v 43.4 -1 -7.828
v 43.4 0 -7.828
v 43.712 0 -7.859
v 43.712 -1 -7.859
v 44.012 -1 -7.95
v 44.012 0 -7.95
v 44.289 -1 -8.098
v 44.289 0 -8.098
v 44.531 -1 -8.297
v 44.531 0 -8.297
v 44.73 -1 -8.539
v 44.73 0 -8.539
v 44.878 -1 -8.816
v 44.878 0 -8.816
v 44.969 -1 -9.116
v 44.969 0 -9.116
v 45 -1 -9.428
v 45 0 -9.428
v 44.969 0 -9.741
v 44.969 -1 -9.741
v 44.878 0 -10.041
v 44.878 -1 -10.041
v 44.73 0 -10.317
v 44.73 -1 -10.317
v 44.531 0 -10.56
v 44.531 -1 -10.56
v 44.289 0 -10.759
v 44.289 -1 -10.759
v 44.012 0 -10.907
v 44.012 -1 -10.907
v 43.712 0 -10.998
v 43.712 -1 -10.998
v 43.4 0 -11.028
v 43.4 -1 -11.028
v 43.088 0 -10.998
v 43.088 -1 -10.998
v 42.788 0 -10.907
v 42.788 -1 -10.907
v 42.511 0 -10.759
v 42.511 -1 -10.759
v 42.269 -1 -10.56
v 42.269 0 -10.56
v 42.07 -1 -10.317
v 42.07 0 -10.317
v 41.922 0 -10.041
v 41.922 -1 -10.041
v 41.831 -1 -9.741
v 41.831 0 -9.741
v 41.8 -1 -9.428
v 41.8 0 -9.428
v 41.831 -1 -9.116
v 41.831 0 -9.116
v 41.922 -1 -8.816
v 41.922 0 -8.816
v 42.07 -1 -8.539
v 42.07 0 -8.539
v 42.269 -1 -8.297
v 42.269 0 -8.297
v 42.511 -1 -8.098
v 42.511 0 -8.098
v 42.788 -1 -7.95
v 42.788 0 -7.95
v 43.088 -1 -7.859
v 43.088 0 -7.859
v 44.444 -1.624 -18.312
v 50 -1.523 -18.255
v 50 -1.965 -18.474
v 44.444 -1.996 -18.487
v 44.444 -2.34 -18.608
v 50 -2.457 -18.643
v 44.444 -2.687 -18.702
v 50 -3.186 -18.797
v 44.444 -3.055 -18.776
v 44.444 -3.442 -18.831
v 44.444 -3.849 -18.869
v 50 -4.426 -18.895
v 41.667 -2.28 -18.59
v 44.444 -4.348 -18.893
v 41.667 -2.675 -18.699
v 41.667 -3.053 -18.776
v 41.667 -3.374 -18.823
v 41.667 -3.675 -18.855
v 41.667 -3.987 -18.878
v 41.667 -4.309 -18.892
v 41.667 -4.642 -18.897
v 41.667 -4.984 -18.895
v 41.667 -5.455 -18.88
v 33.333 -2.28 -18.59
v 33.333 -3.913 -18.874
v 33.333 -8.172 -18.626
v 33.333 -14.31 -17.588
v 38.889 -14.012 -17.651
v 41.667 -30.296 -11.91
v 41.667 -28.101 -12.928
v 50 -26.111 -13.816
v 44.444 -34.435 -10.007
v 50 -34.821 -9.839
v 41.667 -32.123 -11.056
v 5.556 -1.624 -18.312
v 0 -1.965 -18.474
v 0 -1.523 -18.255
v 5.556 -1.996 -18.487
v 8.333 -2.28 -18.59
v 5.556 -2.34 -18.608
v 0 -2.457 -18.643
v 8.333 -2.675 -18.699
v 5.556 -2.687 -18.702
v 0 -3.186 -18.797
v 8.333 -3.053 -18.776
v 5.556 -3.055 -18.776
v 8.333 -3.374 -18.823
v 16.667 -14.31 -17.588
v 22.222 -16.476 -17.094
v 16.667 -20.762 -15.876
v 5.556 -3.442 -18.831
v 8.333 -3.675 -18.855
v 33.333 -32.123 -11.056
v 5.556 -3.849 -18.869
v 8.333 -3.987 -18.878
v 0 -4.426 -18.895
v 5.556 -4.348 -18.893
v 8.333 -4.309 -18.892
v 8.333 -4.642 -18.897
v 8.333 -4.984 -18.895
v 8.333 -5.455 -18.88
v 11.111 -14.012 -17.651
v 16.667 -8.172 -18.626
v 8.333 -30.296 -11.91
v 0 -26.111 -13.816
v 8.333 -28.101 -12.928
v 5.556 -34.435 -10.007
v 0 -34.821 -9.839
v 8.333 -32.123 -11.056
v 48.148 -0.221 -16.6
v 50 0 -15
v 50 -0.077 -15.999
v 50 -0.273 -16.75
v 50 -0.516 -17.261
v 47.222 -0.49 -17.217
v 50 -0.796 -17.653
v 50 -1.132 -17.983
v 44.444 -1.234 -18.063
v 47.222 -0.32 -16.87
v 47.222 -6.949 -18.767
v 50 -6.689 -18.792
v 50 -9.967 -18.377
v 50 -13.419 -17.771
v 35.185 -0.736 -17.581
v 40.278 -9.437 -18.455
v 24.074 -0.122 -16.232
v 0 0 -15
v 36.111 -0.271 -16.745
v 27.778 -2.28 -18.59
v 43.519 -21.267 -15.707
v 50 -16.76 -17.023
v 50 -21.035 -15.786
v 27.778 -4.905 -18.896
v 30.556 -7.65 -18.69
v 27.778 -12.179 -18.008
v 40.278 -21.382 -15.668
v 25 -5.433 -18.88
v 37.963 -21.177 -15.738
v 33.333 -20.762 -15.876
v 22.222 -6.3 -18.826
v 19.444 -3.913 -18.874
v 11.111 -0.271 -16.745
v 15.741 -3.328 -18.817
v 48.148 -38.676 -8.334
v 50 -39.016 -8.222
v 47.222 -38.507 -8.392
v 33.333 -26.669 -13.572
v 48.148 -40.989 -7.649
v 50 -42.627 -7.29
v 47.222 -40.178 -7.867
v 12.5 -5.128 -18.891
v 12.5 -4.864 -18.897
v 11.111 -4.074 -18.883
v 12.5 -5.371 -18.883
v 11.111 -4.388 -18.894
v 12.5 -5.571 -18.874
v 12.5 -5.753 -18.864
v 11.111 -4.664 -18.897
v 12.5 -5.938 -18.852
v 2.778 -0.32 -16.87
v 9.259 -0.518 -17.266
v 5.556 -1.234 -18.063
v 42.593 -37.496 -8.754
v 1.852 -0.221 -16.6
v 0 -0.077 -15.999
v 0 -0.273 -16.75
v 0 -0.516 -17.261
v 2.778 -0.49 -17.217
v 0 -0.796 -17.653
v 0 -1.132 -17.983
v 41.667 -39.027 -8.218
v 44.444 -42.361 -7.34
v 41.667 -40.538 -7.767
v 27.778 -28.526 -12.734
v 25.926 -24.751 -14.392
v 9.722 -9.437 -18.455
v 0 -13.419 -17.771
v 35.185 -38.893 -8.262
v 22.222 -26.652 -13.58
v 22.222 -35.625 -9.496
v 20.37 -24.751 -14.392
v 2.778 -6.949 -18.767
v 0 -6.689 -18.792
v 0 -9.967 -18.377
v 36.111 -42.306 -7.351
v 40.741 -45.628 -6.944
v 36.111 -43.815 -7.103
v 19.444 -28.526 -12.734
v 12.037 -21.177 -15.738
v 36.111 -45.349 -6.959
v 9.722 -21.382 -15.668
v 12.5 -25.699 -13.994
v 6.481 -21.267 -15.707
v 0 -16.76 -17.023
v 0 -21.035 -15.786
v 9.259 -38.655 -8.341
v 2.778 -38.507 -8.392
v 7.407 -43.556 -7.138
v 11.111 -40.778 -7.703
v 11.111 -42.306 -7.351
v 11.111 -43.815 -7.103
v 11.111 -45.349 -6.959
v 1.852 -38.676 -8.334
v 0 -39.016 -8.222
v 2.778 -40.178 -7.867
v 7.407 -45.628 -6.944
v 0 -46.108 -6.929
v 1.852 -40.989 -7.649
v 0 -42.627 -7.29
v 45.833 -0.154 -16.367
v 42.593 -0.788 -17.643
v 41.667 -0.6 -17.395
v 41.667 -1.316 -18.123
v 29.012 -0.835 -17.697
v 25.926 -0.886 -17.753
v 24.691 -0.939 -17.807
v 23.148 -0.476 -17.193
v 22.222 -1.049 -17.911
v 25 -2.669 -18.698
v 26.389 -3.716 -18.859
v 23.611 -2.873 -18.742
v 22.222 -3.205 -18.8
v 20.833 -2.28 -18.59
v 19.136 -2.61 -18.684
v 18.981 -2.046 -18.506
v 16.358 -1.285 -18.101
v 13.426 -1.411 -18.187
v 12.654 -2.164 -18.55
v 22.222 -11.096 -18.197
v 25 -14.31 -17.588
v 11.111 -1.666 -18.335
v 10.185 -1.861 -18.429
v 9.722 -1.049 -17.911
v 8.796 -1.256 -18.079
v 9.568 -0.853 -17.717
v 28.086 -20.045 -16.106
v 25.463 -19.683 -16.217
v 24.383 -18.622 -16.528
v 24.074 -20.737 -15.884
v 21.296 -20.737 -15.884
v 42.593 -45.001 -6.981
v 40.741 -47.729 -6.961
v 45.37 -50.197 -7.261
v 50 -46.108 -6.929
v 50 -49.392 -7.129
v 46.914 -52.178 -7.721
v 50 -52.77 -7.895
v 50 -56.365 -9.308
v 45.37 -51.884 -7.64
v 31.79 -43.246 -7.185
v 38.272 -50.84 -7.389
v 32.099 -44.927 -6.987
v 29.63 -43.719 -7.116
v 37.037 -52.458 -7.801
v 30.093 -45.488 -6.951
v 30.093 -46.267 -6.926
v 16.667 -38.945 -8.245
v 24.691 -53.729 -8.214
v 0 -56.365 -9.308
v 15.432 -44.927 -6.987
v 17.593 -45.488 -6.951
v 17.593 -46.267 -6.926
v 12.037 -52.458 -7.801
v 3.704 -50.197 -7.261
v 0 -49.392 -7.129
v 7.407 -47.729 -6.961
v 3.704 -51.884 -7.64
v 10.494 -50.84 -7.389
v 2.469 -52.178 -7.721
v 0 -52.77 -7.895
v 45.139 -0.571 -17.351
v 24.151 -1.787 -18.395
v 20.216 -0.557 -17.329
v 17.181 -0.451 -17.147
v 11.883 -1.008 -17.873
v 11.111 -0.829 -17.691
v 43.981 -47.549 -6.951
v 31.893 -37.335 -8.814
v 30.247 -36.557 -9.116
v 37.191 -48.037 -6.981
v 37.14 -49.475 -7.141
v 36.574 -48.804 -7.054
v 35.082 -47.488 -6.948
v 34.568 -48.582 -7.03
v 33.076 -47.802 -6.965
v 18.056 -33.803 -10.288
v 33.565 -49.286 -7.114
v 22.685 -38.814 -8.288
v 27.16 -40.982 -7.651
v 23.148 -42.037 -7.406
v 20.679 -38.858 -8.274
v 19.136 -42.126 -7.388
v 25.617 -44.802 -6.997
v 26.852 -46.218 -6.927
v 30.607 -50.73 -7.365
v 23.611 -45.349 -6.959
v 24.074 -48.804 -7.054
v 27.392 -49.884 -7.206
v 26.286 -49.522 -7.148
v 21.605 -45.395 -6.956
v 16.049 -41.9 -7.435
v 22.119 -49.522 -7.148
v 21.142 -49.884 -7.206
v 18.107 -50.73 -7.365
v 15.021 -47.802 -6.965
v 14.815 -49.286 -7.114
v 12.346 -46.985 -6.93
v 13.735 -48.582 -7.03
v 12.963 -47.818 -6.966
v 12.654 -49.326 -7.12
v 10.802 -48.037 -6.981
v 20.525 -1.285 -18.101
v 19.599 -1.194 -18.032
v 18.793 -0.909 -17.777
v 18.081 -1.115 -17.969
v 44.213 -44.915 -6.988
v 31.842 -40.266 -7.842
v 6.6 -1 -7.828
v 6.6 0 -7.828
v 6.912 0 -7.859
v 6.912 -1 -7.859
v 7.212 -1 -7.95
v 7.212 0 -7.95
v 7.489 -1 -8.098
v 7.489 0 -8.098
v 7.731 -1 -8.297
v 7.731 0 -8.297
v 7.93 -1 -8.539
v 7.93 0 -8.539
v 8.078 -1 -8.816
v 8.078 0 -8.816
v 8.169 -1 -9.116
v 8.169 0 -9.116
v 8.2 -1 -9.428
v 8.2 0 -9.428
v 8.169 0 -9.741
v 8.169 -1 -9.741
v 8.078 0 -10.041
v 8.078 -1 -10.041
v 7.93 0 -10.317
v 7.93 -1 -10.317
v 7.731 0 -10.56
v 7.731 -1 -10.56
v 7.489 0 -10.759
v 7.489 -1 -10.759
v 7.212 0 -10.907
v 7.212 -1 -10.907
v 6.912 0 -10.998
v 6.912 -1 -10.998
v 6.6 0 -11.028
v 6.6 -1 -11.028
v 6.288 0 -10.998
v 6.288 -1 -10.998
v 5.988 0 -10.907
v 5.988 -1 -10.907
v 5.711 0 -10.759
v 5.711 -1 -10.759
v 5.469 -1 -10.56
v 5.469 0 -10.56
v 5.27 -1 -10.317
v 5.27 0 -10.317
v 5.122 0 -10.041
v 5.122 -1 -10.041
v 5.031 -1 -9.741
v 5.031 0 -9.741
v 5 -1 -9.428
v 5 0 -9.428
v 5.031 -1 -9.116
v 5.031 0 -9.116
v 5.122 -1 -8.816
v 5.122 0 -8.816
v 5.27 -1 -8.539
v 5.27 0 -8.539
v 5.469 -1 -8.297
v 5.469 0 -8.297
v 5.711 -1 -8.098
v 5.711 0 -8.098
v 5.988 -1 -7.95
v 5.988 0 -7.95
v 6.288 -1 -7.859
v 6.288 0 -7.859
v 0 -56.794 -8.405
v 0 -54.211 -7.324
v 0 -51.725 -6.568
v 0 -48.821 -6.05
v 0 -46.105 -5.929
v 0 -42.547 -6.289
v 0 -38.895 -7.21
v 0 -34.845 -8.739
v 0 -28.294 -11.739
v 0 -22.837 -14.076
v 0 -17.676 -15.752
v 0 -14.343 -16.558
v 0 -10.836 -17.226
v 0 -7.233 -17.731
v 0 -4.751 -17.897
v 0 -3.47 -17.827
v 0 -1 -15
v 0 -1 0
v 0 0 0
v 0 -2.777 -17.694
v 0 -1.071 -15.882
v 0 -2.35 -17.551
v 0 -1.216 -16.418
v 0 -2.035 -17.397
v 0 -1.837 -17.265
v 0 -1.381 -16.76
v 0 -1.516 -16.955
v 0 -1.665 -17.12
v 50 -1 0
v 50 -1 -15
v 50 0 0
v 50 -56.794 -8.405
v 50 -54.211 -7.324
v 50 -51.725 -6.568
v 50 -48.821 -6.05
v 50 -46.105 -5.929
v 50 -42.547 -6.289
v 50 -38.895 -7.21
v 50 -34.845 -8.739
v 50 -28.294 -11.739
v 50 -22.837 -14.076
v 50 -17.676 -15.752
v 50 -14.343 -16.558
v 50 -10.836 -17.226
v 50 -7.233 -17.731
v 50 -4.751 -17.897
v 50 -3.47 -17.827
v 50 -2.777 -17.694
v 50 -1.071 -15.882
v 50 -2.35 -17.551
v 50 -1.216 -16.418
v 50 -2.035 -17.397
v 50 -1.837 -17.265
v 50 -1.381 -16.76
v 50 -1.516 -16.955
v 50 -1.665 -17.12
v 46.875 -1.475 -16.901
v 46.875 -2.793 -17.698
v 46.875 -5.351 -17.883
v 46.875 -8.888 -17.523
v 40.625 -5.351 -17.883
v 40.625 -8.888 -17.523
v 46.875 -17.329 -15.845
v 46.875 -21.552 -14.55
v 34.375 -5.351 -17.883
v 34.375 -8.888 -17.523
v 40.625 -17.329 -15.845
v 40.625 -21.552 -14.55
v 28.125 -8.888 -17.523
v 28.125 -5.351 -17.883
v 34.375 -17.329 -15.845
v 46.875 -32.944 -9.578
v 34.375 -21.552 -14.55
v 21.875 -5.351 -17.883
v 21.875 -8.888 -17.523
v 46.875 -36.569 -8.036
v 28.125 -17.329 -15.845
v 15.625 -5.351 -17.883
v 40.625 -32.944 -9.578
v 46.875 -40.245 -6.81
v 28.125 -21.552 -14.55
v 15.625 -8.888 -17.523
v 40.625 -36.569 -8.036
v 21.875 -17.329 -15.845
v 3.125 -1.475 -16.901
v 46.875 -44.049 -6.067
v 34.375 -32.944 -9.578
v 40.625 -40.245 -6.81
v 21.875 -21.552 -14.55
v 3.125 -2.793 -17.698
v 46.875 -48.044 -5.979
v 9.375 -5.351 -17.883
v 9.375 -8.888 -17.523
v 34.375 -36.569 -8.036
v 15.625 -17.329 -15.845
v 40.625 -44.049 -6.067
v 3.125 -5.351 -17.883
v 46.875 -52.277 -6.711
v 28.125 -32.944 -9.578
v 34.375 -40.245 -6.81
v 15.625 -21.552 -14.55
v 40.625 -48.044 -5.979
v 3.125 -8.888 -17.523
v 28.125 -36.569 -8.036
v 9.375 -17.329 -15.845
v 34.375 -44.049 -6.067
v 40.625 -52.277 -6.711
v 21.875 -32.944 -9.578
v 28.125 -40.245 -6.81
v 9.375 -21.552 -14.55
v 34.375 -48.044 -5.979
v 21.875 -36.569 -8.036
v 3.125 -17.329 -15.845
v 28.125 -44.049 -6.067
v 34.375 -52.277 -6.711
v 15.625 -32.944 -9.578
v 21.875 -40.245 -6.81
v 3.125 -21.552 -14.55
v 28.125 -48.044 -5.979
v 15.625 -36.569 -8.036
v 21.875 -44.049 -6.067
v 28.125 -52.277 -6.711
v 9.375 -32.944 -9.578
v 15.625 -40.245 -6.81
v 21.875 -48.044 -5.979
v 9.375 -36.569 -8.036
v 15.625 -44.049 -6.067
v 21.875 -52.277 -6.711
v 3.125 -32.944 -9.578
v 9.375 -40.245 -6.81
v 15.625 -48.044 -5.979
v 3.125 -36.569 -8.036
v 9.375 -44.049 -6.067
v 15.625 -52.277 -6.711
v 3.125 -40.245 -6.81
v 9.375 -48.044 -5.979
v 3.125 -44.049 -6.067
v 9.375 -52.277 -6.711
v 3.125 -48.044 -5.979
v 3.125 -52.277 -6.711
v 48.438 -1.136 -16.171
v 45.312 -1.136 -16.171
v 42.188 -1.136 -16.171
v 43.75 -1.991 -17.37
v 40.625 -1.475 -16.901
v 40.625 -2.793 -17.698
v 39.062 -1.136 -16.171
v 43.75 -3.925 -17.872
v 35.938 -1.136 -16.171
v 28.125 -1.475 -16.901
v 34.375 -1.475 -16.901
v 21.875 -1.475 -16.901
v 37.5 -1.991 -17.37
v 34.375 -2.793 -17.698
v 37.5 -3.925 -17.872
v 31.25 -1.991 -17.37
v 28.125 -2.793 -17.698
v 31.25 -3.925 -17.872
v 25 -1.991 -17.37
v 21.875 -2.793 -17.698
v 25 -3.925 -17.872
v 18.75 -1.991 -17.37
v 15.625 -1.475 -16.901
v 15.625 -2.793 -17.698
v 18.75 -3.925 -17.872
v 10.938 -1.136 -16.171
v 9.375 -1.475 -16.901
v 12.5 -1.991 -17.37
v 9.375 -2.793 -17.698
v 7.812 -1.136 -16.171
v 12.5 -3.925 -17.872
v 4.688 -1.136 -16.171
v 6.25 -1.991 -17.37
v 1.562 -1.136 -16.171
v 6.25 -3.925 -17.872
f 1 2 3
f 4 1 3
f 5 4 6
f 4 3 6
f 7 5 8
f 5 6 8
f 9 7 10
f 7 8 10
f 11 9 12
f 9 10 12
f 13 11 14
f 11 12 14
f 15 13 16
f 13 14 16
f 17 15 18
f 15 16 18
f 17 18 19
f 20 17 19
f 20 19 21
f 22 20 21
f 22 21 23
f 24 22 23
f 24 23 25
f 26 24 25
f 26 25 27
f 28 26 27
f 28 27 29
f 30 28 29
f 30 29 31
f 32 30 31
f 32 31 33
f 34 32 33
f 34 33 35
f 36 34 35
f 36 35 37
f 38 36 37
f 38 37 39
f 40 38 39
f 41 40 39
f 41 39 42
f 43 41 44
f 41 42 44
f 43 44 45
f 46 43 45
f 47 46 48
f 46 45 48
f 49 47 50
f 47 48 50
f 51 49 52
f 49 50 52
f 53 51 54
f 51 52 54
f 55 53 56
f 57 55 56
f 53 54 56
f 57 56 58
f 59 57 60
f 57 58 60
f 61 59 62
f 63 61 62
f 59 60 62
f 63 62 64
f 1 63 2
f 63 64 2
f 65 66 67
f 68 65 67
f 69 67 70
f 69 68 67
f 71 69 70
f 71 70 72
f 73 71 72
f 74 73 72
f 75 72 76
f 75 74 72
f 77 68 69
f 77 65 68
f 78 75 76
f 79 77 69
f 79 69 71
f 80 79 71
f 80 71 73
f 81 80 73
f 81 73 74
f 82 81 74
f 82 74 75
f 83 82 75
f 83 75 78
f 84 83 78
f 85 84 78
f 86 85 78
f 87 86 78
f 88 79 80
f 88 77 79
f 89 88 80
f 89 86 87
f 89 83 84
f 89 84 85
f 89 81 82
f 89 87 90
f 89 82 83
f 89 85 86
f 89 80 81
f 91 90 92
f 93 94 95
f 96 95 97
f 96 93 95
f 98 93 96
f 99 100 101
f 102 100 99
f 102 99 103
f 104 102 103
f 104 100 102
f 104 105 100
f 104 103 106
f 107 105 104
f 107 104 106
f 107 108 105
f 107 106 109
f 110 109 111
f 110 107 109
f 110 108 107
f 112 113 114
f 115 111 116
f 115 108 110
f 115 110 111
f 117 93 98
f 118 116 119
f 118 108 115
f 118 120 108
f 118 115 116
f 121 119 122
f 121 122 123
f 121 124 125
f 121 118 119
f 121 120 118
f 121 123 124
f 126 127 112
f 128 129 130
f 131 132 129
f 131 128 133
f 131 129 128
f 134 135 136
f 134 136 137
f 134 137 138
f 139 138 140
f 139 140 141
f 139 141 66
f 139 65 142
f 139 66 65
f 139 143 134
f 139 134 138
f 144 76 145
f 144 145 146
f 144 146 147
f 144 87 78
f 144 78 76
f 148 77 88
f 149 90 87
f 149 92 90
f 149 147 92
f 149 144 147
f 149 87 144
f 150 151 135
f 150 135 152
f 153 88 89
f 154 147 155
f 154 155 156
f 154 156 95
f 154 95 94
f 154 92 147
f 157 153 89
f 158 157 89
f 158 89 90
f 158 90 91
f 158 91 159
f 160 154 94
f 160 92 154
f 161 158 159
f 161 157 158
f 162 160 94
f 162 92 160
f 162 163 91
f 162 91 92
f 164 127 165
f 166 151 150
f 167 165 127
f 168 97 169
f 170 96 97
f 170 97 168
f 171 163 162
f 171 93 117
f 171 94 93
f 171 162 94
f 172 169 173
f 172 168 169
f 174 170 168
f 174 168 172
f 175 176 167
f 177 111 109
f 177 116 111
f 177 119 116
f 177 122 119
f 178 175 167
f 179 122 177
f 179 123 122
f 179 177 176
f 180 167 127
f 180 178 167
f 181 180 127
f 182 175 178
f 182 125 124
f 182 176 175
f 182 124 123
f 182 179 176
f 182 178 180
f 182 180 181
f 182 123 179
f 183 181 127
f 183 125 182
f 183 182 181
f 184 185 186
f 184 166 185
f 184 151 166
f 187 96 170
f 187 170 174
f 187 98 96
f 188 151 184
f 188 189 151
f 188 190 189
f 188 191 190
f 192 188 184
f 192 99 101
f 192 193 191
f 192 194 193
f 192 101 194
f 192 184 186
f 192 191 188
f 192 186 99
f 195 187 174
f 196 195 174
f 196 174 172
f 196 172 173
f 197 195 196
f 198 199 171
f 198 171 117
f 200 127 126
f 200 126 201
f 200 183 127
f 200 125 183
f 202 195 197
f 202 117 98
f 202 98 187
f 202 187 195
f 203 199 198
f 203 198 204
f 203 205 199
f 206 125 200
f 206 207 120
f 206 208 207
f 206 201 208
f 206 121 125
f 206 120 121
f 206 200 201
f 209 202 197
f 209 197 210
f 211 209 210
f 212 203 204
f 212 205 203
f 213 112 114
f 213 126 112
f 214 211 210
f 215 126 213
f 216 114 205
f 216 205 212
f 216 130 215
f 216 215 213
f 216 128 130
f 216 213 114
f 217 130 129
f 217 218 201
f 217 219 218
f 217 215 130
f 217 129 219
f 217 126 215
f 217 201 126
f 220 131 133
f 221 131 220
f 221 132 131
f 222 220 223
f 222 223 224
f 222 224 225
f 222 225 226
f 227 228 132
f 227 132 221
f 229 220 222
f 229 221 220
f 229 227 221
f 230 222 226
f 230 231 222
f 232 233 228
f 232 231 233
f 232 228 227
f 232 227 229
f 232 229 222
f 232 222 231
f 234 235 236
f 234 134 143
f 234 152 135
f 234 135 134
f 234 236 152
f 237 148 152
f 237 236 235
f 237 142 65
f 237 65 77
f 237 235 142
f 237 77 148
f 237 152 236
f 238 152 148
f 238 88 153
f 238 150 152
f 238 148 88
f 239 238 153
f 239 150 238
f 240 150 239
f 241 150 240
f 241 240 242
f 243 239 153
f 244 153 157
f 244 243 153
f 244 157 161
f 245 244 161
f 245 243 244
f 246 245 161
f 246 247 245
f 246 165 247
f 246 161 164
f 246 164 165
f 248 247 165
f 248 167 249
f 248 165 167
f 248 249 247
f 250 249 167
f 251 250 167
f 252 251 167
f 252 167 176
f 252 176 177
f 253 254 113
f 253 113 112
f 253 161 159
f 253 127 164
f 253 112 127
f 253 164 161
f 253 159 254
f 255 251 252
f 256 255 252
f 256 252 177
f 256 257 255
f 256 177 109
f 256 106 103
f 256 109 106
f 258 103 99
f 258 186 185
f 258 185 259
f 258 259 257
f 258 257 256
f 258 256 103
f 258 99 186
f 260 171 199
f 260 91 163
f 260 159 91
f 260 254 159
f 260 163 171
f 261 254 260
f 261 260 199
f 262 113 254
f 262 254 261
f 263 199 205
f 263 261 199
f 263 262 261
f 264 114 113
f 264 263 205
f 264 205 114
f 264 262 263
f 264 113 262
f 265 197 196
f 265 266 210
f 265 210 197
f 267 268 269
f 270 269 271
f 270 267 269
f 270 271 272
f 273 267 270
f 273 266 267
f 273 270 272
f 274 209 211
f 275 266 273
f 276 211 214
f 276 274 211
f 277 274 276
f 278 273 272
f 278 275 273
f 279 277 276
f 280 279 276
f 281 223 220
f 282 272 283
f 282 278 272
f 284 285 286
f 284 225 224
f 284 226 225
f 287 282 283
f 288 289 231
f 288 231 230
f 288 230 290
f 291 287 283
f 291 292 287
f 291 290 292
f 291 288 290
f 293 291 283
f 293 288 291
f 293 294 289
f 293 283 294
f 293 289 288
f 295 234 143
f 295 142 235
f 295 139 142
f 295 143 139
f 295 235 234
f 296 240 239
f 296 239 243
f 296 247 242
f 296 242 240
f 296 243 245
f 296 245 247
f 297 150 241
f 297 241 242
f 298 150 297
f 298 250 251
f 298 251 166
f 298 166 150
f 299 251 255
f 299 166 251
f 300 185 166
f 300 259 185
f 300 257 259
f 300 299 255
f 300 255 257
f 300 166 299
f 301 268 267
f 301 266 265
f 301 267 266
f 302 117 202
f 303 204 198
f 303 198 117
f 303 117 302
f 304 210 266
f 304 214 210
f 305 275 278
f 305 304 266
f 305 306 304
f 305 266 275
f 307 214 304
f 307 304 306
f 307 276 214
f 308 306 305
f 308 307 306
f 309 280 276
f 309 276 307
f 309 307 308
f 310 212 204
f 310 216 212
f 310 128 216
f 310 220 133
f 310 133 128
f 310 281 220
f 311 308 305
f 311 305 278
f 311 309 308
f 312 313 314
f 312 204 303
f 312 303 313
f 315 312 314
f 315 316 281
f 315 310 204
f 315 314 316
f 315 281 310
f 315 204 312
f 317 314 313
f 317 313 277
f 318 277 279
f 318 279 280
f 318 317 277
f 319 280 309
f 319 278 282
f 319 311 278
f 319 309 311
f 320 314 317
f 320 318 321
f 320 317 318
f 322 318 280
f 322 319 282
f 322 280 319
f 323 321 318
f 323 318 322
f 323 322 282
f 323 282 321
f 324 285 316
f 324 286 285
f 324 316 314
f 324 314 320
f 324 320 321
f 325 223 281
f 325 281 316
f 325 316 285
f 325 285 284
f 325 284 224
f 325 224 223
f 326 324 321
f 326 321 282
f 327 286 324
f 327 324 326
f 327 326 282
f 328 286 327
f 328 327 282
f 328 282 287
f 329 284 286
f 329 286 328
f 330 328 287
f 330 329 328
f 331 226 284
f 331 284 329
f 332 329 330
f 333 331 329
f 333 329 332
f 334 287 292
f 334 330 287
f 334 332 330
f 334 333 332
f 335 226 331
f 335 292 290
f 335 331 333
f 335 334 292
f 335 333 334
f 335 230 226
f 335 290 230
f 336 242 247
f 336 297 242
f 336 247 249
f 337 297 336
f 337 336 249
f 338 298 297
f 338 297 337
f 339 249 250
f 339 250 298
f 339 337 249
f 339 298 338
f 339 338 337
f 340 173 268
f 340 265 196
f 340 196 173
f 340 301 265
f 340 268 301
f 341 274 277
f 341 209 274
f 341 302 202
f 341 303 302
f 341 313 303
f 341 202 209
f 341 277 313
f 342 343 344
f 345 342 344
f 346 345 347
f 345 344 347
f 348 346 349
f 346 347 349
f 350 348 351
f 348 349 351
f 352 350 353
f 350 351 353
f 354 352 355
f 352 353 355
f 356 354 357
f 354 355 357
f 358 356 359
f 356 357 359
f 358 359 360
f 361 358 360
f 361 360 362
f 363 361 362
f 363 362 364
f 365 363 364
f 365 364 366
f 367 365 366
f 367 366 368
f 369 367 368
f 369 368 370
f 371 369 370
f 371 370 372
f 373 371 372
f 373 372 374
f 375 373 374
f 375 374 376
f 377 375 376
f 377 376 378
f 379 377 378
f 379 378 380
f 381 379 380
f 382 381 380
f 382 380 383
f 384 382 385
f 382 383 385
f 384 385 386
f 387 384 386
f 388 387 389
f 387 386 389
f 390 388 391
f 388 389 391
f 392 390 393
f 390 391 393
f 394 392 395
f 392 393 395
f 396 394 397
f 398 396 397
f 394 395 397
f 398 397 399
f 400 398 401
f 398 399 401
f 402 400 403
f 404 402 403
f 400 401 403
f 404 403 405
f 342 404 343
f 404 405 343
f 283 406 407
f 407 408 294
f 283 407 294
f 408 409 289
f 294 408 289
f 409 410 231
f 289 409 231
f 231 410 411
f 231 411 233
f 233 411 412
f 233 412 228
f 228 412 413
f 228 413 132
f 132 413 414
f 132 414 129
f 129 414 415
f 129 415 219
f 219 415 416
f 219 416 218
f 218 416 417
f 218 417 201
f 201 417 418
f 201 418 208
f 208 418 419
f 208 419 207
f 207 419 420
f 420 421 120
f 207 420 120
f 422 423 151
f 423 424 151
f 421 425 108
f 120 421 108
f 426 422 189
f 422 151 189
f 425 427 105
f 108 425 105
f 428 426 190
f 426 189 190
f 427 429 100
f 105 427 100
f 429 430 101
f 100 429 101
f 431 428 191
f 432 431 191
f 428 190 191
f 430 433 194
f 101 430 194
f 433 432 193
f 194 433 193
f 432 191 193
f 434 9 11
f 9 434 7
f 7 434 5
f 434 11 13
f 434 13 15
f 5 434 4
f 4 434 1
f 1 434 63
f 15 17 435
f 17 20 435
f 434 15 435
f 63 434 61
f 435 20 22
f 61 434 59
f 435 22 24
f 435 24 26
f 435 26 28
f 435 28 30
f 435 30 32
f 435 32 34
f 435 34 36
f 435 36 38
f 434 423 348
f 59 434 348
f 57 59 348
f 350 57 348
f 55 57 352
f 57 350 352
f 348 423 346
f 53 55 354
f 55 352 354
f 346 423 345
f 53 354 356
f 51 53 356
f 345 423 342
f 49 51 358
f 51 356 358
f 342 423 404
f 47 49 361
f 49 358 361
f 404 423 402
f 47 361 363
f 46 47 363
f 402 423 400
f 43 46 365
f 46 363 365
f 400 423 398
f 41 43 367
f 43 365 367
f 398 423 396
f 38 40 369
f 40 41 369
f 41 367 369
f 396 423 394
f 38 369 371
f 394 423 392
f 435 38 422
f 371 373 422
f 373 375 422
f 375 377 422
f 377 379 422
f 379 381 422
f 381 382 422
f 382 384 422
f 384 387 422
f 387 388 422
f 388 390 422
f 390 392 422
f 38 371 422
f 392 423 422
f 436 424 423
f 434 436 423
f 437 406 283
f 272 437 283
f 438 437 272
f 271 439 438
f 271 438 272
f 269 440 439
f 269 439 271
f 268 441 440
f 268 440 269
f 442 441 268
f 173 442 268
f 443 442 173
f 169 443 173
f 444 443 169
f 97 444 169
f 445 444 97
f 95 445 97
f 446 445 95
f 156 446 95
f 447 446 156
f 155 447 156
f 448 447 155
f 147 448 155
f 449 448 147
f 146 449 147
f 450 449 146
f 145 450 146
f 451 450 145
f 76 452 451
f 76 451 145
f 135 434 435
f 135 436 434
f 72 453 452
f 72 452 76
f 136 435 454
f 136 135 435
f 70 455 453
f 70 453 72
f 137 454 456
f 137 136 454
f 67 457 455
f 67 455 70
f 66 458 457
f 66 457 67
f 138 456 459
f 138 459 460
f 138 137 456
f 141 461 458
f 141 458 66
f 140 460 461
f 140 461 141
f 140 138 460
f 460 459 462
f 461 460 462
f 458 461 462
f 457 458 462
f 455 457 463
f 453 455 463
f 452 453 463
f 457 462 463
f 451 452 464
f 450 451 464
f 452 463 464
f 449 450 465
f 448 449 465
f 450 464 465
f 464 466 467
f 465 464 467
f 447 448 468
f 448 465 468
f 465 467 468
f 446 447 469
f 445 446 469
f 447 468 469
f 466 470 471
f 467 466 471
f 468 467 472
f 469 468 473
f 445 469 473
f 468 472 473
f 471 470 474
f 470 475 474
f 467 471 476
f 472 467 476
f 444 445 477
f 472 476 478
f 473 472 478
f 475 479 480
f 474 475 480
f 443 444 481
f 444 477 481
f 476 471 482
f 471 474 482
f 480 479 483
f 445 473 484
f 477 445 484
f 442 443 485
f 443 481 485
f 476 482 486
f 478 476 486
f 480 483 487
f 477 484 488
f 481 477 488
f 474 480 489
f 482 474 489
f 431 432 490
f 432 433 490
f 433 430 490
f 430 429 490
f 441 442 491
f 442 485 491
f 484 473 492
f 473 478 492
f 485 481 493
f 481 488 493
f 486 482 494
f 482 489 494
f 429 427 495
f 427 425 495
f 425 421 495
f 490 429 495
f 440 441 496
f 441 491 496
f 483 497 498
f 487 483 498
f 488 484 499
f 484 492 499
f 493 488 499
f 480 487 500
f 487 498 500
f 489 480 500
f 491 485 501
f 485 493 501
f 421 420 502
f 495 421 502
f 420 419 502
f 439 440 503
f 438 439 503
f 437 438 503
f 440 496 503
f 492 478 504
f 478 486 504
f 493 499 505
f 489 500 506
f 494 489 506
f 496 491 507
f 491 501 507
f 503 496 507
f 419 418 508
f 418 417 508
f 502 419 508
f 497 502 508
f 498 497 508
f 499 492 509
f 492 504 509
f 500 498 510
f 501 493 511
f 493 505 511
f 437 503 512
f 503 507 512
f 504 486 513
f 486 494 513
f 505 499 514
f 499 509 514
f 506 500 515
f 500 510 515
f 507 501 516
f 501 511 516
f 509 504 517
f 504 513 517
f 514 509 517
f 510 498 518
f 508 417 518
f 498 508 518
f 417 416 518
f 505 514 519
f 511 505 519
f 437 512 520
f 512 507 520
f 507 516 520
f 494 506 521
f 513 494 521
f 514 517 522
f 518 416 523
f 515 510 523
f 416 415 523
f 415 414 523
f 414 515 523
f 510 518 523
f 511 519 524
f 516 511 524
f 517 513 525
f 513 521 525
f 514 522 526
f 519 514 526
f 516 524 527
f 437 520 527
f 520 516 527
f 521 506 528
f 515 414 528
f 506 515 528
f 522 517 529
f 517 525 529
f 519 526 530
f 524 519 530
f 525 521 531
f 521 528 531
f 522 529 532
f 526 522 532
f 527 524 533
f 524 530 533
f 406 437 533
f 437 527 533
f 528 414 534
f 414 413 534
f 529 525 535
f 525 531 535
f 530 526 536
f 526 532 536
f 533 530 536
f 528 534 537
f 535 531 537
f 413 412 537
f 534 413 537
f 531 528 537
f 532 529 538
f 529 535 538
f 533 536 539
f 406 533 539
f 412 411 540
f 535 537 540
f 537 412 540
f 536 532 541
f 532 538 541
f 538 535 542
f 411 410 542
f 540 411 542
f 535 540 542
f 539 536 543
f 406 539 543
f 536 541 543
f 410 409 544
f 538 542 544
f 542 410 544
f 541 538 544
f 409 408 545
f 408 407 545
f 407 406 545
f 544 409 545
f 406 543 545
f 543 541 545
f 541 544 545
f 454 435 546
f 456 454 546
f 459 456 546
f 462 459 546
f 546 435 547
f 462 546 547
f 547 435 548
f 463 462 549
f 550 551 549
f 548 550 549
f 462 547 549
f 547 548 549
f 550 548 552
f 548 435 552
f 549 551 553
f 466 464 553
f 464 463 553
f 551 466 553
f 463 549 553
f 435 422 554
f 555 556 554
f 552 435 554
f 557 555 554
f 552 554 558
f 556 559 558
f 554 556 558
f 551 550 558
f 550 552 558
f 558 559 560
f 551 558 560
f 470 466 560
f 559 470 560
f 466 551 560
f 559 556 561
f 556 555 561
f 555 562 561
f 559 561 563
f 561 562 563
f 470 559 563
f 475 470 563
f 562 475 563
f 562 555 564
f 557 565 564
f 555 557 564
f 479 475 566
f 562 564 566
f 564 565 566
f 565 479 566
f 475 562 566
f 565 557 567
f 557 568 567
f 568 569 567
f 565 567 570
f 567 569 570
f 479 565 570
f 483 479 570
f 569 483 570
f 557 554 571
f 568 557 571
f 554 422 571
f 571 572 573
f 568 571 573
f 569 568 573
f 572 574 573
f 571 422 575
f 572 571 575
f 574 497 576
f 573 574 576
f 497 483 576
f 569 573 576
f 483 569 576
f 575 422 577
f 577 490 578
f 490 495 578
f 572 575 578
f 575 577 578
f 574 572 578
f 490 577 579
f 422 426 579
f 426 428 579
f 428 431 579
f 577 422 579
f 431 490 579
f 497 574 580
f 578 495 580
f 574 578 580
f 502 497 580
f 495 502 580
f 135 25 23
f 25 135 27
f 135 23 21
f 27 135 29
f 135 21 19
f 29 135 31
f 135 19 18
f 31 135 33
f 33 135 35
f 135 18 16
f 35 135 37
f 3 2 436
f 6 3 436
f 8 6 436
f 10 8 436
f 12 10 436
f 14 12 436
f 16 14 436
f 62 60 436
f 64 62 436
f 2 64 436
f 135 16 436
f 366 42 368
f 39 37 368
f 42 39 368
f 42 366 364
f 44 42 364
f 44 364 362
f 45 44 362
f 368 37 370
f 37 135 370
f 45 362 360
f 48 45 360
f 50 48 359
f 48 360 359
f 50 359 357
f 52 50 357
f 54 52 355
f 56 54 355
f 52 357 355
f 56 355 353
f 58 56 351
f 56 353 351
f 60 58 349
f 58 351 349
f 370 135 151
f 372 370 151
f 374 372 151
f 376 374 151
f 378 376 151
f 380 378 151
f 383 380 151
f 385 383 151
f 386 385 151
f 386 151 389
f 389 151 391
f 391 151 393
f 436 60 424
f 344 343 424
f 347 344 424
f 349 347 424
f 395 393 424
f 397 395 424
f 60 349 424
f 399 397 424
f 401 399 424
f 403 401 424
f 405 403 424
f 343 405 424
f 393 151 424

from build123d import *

# Parameters (mm, degrees)
EXTRUDE_THIN2_DEPTH = 50
CUT_EXTRUDE1_REACH  = 79.991
SKETCH3_R           = 1.6


# Read off the part's stored shape, not the designer's step: Extrude-Thin2
with BuildPart() as part:
    # Extrude-Thin2 outline → Extrude-Thin2 (new body)
    with BuildSketch(Plane(origin=(0, 0, 0), x_dir=(0, 0, -1), z_dir=(1, 0, 0))):
        with BuildLine():
            Line((0, -1), (15, -1))
            add(Edge.make_bspline(
                [(15, -1), (15.47470013, -1), (15.861826032, -1.051589998), (16.480855292, -1.220985667), (16.712550056, -1.336053941), (17.089368537, -1.613453741), (17.238727793, -1.77767428), (17.501655418, -2.204581945), (17.612769335, -2.469390698), (17.783374091, -3.115625013), (17.841976302, -3.495679067), (17.902505292, -4.354355009), (17.904704994, -4.832563181), (17.861462775, -5.869536859), (17.816186167, -6.428296676), (17.691586748, -7.612293875), (17.612995195, -8.238955838), (17.163932748, -11.483031174), (16.606541025, -14.44214967), (15.654491825, -18.050324208), (15.451355727, -18.767419737), (15.019686347, -20.178768294), (14.790947871, -20.871355568), (14.06749291, -22.914211322), (13.537719224, -24.230859394), (11.877778677, -28.084635108), (10.676244262, -30.525126108), (8.480745218, -35.362065845), (7.485826344, -37.759496578), (6.134782684, -42.729757515), (5.781916626, -45.305843109), (6.176613166, -50.78276898), (6.924566965, -53.675807088), (8.40515267, -56.793673131)],
                knots=[0, 0, 0, 0, 0.03125, 0.03125, 0.0625, 0.0625, 0.09375, 0.09375, 0.125, 0.125, 0.15625, 0.15625, 0.1875, 0.1875, 0.21875, 0.21875, 0.25, 0.25, 0.375, 0.375, 0.40625, 0.40625, 0.4375, 0.4375, 0.5, 0.5, 0.625, 0.625, 0.75, 0.75, 0.875, 0.875, 1, 1, 1, 1], degree=3))
            Line((8.40515267, -56.793673131), (9.308475158, -56.364711032))
            add(Edge.make_bspline(
                [(15, 0), (19.130938443, 0), (19.312220409, -5.977847724), (14.406460667, -31.179131787), (2.663773864, -42.372080643), (9.308475158, -56.364711032)],
                knots=[0, 0, 0, 0, 0.236283029, 0.420799842, 1, 1, 1, 1], degree=3))
            Line((15, 0), (0, 0))
            Line((0, 0), (0, -1))
        make_face()
    extrude(amount=EXTRUDE_THIN2_DEPTH)

    # Sketch3 → Cut-Extrude1 (cut, up to next)
    with BuildSketch(Plane(origin=(0, 0, 0), x_dir=(1, 0, 0), z_dir=(0, 1, 0)), mode=Mode.PRIVATE) as cut_extrude1_sk1:
        with Locations(Location((6.6, 9.428361527, 0), (0, 0, 270))):
            Circle(SKETCH3_R)
    cut_extrude1_tool1 = extrude(cut_extrude1_sk1.sketch, amount=-CUT_EXTRUDE1_REACH, mode=Mode.PRIVATE) & part.part
    # Sketch3 → Cut-Extrude1 (cut, up to next)
    with BuildSketch(Plane(origin=(0, 0, 0), x_dir=(1, 0, 0), z_dir=(0, 1, 0)), mode=Mode.PRIVATE) as cut_extrude1_sk2:
        with Locations(Location((43.4, 9.428361527, 0), (0, 0, 270))):
            Circle(SKETCH3_R)
    cut_extrude1_tool2 = extrude(cut_extrude1_sk2.sketch, amount=-CUT_EXTRUDE1_REACH, mode=Mode.PRIVATE) & part.part
    add(cut_extrude1_tool1.solids().sort_by_distance((6.6, 0, -9.428362))[0], mode=Mode.SUBTRACT)
    add(cut_extrude1_tool2.solids().sort_by_distance((43.4, 0, -9.428362))[0], mode=Mode.SUBTRACT)


solid = part.part
